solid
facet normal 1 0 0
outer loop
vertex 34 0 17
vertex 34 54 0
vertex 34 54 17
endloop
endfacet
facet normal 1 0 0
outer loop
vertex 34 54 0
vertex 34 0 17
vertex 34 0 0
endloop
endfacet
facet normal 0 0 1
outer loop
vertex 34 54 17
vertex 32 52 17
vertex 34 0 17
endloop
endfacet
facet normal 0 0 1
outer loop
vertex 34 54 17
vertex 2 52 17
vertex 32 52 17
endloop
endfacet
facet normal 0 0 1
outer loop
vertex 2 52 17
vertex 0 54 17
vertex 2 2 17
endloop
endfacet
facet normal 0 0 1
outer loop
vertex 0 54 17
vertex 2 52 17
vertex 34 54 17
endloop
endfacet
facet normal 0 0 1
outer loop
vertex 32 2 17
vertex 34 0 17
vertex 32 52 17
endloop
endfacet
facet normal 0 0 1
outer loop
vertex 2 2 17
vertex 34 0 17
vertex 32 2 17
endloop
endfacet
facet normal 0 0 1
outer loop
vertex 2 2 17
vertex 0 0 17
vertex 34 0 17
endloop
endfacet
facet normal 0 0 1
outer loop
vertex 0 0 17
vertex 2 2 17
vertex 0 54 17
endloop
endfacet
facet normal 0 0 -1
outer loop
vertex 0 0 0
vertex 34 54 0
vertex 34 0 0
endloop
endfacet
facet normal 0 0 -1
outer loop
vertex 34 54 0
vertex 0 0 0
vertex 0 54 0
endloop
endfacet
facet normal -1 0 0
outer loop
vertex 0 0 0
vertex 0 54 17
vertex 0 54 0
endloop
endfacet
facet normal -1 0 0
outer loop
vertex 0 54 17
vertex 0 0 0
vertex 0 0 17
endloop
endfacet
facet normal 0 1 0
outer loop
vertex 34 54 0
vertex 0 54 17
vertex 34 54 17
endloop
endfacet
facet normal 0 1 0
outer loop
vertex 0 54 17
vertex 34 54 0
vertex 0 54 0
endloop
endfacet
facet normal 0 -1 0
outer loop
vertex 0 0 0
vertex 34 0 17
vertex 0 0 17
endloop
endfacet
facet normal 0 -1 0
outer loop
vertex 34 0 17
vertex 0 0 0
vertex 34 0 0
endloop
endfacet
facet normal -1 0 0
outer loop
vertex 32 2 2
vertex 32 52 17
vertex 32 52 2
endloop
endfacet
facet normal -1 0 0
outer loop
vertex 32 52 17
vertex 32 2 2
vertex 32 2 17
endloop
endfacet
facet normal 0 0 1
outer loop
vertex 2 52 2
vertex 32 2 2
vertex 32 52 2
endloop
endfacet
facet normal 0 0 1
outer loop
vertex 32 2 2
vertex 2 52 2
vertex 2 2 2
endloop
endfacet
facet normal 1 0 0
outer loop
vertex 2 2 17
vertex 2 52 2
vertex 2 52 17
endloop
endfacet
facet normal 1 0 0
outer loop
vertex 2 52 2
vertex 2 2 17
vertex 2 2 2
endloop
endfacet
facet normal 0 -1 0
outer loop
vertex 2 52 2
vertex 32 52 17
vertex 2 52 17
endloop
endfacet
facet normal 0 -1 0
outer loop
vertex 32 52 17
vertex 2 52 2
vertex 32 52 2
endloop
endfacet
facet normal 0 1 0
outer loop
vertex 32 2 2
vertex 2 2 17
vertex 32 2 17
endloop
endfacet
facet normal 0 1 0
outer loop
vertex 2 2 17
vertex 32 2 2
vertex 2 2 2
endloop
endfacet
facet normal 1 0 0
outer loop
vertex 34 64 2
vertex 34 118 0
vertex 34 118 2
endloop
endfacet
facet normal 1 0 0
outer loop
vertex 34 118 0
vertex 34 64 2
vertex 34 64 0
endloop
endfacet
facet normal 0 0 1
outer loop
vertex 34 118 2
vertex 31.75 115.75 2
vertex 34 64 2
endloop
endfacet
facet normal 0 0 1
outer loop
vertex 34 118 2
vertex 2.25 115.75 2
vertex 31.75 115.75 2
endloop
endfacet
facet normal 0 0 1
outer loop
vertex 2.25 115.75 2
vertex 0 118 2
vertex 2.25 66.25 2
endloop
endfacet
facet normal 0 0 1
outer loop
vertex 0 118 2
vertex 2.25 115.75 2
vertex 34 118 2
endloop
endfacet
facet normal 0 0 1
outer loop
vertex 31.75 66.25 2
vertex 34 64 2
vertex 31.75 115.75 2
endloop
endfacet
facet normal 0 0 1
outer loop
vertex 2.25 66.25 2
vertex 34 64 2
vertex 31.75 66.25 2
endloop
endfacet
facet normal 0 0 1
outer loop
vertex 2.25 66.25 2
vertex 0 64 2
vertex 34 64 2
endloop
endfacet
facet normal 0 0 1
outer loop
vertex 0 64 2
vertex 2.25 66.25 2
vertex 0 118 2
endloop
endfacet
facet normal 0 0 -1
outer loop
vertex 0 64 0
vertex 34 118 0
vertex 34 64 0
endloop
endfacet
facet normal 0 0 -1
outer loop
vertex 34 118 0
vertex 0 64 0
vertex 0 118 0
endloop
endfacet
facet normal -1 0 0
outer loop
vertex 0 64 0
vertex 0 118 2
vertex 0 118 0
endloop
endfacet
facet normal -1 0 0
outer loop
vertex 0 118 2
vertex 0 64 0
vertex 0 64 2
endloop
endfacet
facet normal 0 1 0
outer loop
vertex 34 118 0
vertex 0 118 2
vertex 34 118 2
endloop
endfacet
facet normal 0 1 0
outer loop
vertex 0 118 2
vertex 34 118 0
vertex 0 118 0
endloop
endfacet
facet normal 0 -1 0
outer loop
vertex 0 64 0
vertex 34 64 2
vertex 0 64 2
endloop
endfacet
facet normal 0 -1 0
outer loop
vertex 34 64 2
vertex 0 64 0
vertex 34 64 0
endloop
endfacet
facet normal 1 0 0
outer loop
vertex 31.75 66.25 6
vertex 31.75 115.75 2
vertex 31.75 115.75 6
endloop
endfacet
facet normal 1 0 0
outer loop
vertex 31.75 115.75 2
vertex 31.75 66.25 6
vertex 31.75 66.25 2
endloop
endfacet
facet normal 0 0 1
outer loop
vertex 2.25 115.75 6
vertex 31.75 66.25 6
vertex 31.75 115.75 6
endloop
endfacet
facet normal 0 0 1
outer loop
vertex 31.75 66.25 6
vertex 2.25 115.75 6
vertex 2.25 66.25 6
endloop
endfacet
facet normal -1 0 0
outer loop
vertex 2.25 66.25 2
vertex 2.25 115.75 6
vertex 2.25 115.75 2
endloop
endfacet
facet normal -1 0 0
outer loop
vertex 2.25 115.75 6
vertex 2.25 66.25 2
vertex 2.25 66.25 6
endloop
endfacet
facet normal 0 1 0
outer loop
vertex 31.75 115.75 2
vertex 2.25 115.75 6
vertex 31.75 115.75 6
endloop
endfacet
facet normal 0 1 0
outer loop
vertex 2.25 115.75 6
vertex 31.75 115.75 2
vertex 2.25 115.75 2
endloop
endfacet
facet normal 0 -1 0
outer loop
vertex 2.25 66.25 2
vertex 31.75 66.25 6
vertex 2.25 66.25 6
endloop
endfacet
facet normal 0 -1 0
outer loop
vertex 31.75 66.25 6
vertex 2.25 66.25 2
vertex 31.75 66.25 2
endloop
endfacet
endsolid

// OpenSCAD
// Box with a press-fit lid - a hollow rectangular box (open top) and a separate lid whose plug
// drops into the opening. The two parts are laid side by side. NOVEL general part.
//
// @desc hollow box with a separate press-fit lid
// @prompt Design a small box with a lid in OpenSCAD: an inner space {il} by {iw} by {ih} mm with {wall} mm walls, and a separate lid whose plug drops {lip} mm into the opening. Lay the two parts side by side. Reply with a single complete OpenSCAD file.
// @param il   inner length, mm     [20:80]
// @param iw   inner width, mm      [20:60]
// @param ih   inner height, mm     [10:50]
// @param wall wall thickness, mm   [1.6:4]
// @param lip  lid plug depth, mm   [3:10]

il   = 30;
iw   = 50;
ih   = 15;
wall = 2;
lip  = 4;

$fn = 32;

ol = il + 2 * wall;
ow = iw + 2 * wall;

module box() {
    difference() {
        cube([ol, ow, ih + wall]);
        translate([wall, wall, wall]) cube([il, iw, ih + 1]);   // open-top cavity
    }
}

module lid() {
    cl = il - 0.5;                 // plug: 0.25 mm clearance per side
    cw = iw - 0.5;
    union() {
        cube([ol, ow, wall]);                                    // top plate, full footprint
        translate([(ol - cl) / 2, (ow - cw) / 2, 0])
            cube([cl, cw, wall + lip]);                          // plug (overlaps the plate -> one solid)
    }
}

box();
translate([0, ow + 10, 0]) lid();
